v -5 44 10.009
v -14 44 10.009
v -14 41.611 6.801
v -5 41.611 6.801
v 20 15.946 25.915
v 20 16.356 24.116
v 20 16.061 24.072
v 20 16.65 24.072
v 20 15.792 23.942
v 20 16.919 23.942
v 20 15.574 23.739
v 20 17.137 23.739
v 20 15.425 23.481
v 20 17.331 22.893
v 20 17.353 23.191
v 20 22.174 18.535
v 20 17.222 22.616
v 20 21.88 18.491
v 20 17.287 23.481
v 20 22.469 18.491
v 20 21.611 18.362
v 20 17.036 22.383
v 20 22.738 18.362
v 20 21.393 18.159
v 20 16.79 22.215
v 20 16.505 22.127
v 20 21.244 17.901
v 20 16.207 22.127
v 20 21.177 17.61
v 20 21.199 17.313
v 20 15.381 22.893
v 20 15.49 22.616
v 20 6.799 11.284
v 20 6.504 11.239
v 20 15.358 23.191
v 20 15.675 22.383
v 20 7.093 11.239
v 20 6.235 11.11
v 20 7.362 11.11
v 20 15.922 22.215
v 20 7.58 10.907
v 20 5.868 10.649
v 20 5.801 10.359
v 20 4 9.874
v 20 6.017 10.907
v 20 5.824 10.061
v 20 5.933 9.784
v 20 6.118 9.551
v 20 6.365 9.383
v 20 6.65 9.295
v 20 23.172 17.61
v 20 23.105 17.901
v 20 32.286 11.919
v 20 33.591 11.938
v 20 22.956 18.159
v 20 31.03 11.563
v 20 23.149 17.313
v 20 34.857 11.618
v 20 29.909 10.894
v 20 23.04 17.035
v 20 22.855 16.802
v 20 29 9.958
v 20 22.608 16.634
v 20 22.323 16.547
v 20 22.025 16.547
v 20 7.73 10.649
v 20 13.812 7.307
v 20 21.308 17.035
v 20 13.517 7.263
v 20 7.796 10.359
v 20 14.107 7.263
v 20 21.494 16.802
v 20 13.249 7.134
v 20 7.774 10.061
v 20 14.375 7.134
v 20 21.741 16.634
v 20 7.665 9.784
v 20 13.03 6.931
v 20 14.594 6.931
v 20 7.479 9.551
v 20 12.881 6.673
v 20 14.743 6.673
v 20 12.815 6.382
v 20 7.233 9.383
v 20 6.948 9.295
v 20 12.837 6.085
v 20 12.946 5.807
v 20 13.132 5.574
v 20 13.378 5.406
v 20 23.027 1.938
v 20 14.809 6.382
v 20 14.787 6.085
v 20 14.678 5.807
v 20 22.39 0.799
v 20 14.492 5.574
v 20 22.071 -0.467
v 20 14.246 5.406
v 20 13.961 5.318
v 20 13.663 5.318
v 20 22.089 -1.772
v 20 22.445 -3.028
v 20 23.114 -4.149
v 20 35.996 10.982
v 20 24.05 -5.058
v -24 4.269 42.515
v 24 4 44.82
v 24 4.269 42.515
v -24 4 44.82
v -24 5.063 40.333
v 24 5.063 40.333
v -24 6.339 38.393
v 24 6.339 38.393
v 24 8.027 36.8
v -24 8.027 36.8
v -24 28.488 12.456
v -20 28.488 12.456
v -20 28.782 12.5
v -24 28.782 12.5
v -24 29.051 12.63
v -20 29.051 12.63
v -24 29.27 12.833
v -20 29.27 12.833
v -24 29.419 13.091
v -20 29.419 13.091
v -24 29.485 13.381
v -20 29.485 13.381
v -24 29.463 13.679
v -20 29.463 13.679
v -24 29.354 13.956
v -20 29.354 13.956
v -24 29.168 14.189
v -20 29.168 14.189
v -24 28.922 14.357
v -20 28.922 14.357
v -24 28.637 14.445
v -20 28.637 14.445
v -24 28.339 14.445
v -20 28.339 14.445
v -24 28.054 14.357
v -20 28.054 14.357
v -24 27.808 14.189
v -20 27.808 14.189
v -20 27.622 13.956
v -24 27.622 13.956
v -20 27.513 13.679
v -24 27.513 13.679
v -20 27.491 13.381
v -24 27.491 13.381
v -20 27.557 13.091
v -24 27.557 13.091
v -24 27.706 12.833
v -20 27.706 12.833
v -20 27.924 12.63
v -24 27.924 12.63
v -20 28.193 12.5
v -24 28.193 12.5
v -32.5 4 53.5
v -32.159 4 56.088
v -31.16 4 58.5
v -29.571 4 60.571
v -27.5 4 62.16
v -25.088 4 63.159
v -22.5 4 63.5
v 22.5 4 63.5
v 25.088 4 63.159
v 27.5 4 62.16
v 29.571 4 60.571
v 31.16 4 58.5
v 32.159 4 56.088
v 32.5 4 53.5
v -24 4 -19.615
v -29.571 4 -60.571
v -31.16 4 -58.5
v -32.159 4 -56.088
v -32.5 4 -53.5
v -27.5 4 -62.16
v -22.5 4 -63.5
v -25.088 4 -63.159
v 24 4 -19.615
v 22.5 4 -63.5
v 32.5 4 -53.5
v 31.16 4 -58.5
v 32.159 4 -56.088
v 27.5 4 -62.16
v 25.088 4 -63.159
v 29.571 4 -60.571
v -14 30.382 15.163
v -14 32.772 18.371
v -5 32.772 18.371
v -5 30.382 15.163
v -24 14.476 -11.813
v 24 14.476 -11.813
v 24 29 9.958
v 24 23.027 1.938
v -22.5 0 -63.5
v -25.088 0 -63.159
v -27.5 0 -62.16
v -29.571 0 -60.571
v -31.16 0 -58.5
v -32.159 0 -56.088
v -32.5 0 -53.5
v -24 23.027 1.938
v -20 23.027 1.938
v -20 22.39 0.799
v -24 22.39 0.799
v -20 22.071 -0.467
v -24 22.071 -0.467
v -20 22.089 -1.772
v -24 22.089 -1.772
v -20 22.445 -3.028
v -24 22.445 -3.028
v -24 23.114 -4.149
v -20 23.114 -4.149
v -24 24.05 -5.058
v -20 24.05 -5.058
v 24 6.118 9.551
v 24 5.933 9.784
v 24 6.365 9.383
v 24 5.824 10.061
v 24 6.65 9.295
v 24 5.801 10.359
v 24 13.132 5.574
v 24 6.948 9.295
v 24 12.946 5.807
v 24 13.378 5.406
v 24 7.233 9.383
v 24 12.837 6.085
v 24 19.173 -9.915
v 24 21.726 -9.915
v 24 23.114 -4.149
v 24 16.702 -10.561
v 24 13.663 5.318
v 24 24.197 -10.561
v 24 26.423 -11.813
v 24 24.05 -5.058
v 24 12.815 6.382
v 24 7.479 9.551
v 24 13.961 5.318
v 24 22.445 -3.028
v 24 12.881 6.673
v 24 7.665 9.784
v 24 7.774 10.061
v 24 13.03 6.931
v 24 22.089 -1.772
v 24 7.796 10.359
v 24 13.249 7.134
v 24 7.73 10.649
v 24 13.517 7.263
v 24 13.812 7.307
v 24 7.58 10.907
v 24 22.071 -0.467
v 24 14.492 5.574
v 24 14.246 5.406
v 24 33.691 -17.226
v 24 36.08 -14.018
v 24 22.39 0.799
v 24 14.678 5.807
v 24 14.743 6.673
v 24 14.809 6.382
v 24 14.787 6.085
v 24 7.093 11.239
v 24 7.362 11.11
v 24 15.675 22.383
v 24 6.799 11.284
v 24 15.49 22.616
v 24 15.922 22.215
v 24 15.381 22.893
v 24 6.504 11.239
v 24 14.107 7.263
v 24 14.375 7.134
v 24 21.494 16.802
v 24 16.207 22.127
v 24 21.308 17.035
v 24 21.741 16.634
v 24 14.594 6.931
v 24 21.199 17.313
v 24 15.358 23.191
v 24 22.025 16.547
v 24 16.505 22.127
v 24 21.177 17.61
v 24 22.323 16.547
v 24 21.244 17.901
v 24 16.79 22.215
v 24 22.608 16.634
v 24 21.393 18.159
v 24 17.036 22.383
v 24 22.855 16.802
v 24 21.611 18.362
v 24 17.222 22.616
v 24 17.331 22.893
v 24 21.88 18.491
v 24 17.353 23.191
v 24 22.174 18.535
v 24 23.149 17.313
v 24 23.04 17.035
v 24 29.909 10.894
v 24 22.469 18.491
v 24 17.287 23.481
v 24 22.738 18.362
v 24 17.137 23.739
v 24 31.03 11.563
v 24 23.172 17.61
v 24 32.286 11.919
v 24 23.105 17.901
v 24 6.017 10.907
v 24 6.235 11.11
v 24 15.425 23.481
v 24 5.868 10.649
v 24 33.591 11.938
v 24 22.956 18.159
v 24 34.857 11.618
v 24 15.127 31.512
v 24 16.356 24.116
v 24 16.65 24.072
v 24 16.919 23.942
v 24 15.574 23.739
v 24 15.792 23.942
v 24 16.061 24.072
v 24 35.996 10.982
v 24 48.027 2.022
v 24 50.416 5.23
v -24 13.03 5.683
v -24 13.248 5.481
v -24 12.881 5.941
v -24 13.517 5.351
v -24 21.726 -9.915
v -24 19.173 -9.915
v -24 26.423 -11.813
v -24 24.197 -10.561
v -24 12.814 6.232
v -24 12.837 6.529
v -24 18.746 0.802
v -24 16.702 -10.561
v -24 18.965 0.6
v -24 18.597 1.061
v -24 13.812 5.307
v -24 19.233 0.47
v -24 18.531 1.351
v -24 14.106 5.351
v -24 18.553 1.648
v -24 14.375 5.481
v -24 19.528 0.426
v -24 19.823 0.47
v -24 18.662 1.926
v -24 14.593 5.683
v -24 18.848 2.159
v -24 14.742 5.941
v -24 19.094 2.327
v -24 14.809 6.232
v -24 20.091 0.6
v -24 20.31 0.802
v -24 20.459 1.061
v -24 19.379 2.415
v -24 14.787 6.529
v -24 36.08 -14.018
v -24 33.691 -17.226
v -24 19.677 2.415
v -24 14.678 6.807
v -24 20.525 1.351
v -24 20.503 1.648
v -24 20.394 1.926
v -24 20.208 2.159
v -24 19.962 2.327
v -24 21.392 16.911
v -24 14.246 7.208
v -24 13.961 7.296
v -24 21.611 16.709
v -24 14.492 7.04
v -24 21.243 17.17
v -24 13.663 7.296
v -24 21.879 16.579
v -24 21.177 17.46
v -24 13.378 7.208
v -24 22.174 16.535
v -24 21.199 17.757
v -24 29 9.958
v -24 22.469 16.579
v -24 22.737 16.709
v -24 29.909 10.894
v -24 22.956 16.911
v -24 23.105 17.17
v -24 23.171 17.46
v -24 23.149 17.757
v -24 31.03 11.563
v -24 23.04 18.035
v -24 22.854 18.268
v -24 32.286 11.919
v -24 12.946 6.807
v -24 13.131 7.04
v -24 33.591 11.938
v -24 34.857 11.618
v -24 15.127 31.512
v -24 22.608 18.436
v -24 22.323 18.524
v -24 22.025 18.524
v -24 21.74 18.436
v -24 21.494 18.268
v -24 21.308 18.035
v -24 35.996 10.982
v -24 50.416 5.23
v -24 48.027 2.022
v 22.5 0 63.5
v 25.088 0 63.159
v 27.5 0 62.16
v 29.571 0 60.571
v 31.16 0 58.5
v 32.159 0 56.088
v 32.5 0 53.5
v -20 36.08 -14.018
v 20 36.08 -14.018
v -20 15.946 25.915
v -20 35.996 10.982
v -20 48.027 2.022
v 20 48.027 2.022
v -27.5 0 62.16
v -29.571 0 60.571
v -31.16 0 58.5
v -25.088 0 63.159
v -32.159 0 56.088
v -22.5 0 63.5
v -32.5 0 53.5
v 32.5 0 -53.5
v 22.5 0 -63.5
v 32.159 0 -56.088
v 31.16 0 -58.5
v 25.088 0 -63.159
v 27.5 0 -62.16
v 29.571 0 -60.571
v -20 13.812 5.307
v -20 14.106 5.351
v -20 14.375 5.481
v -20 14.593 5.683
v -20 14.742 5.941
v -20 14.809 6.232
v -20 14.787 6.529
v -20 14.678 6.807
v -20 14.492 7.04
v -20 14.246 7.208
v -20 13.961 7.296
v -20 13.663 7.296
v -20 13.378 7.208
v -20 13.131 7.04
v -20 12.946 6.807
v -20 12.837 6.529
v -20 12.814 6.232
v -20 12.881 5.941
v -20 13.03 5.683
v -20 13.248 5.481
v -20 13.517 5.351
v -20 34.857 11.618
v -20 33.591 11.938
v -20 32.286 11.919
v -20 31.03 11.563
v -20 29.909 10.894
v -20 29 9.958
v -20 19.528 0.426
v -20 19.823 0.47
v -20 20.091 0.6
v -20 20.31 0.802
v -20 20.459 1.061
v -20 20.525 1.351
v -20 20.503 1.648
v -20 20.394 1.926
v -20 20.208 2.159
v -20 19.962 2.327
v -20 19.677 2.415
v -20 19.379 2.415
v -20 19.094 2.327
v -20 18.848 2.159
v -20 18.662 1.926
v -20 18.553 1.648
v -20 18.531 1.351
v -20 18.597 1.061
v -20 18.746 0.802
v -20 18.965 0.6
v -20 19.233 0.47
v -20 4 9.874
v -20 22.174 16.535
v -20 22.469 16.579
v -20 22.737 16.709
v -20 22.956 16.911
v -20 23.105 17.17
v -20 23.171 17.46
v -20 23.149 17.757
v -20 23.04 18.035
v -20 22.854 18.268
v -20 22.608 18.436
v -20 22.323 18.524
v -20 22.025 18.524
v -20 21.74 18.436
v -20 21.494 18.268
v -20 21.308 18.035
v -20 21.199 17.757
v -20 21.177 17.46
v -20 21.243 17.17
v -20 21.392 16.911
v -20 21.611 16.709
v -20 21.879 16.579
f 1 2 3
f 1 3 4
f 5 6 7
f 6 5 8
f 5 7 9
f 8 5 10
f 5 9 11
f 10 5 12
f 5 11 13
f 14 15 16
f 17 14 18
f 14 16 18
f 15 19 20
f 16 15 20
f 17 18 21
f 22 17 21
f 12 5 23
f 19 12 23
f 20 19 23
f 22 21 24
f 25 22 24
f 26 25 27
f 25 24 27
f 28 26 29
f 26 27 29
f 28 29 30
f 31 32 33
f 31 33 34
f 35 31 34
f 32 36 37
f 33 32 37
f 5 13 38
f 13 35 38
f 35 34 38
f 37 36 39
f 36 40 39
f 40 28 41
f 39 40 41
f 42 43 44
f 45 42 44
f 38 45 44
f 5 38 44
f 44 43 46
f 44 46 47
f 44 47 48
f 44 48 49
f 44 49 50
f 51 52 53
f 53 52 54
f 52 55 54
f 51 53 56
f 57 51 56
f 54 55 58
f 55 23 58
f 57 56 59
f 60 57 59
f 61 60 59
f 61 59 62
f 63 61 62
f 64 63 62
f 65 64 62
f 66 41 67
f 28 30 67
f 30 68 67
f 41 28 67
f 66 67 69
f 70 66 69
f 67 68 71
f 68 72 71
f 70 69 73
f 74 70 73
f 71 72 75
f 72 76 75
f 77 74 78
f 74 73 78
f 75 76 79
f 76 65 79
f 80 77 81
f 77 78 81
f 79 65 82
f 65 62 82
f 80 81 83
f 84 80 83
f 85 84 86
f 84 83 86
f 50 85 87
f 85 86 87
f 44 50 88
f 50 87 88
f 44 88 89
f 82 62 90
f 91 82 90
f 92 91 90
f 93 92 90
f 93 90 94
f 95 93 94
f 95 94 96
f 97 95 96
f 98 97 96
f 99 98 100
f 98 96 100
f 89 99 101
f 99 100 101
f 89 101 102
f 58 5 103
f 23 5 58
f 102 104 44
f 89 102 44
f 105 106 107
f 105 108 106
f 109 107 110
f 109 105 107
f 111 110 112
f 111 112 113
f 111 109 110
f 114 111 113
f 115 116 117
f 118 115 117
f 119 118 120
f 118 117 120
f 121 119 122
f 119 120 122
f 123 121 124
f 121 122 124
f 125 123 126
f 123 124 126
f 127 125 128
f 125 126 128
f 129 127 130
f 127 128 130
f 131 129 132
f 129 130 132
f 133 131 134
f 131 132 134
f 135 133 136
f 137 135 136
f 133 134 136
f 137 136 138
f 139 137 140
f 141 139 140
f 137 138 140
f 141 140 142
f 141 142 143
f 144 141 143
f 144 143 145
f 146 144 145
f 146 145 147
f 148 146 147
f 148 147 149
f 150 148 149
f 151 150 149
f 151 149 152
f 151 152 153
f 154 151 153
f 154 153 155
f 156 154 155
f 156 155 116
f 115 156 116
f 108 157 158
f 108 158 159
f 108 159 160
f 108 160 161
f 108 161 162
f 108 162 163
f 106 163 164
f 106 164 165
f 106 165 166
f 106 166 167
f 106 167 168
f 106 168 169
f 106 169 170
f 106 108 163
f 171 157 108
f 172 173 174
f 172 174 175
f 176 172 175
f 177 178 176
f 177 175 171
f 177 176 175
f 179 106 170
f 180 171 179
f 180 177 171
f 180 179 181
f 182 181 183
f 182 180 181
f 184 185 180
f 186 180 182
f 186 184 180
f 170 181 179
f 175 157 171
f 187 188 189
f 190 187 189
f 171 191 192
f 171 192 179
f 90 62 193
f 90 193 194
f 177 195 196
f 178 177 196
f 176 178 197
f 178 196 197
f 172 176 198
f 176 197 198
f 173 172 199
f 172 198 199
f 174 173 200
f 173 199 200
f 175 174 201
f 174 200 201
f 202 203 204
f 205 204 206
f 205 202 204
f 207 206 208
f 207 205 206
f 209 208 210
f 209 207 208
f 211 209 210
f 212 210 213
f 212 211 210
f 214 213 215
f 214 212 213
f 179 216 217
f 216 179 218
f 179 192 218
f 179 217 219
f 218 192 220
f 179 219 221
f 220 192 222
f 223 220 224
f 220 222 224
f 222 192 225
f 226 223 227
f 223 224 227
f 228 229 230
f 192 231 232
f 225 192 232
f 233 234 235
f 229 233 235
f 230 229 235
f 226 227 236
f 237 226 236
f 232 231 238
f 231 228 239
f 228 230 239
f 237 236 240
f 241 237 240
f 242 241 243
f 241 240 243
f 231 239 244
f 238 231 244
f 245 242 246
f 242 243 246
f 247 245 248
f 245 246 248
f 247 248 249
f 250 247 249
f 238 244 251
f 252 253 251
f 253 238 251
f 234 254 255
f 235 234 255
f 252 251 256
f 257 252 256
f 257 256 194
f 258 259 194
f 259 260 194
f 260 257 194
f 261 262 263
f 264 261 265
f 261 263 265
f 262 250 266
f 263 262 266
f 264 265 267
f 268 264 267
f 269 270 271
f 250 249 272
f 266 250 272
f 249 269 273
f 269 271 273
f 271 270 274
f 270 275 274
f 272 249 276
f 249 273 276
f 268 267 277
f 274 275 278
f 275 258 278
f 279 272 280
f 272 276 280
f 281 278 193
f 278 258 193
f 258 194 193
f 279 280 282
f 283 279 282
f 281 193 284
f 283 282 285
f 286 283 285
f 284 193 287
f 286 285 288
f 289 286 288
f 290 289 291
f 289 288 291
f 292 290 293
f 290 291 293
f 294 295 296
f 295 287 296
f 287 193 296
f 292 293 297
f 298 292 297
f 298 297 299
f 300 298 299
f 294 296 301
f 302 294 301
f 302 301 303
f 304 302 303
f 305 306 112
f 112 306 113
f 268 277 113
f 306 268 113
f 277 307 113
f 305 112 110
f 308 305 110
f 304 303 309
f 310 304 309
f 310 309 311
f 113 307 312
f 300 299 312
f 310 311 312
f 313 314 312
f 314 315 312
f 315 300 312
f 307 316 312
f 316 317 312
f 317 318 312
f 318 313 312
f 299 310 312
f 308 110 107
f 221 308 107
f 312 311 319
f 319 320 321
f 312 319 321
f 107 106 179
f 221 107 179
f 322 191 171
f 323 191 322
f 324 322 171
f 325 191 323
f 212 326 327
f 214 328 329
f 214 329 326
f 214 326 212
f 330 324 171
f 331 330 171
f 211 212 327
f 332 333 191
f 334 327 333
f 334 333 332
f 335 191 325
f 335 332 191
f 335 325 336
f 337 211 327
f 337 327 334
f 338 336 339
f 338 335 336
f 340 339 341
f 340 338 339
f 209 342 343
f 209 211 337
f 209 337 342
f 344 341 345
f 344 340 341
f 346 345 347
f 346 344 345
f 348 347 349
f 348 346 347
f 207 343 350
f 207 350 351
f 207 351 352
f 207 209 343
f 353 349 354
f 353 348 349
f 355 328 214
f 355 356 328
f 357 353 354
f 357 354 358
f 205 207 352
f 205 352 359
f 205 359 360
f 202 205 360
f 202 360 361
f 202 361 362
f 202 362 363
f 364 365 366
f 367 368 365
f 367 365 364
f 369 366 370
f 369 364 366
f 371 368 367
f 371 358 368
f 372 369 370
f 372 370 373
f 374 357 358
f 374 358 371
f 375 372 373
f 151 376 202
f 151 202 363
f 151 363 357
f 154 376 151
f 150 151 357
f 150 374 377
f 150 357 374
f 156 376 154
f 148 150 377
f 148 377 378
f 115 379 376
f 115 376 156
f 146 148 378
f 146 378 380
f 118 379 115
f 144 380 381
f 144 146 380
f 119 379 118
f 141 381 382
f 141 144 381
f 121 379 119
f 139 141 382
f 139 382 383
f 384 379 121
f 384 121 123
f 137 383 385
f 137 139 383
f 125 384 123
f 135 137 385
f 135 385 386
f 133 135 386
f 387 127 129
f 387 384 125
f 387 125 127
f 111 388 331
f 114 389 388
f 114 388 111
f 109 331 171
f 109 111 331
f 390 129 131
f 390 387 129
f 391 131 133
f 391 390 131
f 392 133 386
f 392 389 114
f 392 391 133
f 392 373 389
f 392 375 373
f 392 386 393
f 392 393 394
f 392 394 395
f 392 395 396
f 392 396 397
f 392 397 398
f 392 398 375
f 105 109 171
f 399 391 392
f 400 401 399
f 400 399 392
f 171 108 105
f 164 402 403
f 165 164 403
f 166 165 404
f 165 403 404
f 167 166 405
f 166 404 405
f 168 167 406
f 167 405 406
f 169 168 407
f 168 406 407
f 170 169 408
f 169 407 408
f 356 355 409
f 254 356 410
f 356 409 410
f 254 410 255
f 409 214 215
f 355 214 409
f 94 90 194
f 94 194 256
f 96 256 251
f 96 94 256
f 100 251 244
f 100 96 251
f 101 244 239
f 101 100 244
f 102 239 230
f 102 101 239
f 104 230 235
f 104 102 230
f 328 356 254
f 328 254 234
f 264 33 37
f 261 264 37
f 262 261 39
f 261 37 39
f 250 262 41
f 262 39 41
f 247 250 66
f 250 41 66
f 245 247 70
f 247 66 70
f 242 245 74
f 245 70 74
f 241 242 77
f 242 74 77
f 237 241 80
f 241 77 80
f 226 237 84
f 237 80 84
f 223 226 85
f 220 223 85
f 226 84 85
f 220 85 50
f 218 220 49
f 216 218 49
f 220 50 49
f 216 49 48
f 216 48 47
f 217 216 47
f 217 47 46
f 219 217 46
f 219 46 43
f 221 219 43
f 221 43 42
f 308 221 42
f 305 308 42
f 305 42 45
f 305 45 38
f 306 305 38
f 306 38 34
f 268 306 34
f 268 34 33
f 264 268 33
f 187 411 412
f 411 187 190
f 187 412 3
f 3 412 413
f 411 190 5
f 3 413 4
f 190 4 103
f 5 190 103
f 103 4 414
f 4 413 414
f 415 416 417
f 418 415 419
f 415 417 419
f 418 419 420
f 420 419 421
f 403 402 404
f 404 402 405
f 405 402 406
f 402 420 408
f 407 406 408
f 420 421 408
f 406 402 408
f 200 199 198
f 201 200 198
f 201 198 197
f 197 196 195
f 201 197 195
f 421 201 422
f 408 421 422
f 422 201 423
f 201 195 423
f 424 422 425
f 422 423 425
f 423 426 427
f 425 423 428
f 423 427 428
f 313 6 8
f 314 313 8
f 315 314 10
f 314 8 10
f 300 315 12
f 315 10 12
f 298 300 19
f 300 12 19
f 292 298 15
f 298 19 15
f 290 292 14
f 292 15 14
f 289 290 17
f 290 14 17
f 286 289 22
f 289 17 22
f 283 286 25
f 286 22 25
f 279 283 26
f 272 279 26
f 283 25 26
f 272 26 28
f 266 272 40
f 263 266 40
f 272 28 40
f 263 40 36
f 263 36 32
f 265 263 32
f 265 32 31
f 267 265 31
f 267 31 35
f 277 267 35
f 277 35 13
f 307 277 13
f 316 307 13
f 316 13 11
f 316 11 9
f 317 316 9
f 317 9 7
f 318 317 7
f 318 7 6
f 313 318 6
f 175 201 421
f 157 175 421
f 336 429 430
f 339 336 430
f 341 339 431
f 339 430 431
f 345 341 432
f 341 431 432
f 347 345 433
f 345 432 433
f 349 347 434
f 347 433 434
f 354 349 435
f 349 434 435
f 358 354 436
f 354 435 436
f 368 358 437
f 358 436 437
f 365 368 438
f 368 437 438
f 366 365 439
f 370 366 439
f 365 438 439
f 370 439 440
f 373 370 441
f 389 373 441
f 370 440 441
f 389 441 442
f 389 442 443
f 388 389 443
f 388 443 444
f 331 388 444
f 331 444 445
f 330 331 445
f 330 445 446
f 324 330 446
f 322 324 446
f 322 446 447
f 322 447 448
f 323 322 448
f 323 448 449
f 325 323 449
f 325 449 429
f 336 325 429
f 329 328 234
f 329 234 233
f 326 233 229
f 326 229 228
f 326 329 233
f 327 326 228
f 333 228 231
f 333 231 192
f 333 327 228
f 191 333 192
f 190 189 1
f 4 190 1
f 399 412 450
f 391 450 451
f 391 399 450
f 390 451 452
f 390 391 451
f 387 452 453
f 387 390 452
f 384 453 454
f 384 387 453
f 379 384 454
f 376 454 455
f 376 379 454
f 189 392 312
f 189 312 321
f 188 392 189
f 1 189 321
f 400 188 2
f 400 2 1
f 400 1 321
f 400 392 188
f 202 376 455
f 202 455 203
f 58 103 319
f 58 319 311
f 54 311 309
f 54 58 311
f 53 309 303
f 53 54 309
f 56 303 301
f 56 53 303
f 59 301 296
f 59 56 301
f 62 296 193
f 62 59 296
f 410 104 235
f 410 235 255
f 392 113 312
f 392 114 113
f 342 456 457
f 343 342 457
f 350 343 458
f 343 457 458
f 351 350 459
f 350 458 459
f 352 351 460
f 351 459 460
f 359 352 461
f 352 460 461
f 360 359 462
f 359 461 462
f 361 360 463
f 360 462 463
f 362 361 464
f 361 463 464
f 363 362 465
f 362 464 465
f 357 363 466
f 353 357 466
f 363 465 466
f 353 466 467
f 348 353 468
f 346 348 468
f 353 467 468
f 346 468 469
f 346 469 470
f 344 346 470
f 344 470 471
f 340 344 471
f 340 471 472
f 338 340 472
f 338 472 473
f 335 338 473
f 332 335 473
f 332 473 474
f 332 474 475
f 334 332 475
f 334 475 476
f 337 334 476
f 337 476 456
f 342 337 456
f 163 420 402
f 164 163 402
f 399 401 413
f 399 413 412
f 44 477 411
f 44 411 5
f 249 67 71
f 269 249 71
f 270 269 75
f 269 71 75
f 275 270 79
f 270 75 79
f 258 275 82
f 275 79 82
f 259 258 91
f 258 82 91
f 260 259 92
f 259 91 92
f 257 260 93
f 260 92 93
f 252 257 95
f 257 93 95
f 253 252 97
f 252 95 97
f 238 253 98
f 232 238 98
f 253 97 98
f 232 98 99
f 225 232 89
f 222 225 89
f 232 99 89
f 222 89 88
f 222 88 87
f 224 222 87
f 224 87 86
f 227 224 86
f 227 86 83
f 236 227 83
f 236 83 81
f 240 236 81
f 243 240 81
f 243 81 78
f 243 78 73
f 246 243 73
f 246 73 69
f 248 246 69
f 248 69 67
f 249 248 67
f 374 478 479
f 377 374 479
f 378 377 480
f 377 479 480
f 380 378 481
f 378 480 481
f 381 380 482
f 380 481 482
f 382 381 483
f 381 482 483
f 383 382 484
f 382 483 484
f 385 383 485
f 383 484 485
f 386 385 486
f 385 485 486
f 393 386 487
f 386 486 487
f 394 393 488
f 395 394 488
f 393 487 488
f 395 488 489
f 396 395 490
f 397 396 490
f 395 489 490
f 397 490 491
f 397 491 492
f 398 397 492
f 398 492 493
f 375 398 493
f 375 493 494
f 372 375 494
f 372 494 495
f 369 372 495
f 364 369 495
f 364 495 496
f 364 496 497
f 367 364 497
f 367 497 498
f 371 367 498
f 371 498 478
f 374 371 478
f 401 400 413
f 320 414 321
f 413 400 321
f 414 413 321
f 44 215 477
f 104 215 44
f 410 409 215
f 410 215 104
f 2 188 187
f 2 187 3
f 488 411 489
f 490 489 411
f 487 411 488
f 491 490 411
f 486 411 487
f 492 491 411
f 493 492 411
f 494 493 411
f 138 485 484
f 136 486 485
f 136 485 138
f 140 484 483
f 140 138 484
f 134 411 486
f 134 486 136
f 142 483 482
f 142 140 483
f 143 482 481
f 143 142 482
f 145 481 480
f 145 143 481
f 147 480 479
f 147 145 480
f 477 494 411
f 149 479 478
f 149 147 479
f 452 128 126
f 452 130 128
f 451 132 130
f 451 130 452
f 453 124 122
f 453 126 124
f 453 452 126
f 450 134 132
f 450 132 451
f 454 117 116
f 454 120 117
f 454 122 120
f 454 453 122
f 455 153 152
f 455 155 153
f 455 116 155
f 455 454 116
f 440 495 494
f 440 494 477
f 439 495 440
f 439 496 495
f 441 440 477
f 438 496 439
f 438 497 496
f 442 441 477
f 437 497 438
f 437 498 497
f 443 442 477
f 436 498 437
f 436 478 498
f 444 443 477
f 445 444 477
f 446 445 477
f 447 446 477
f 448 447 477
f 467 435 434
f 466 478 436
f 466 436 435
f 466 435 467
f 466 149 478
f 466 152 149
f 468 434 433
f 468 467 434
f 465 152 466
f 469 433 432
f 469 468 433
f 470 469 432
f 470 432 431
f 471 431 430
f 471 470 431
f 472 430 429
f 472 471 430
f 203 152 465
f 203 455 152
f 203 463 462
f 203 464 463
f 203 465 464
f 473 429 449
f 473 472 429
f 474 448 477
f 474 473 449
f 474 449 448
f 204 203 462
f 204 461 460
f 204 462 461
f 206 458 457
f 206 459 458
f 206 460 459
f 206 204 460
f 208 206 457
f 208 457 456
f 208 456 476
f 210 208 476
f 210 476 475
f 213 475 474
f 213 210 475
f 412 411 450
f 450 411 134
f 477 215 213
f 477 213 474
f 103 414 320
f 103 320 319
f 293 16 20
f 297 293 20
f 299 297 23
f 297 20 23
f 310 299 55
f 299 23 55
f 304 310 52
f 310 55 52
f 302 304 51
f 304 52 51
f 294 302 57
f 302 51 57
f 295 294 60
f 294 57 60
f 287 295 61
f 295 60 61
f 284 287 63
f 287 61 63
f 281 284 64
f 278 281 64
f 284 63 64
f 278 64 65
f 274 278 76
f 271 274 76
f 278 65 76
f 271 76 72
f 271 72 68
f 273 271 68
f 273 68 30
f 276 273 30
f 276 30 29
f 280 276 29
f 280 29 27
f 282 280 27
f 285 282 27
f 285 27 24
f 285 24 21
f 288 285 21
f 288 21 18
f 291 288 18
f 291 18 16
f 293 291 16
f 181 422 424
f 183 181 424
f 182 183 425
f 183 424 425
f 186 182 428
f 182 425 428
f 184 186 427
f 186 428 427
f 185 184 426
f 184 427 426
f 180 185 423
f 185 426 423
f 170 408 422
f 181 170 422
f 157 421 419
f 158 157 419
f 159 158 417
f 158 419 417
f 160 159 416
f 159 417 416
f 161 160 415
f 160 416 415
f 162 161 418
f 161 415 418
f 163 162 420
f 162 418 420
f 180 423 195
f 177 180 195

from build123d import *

# Parameters (mm, degrees)
BASE_PLATE_EXTRUDE_DEPTH    = 4
MOTORCASEEXTRUDE_DEPTH      = 24
MOTORCASEEXTRUDE_DEPTH_BACK = 24
SKETCH7_W                   = 40
SKETCH7_H                   = 20
CUT_EXTRUDE1_DEPTH          = 44
SKETCH9_W                   = 48
SKETCH9_H                   = 4
CUT_EXTRUDE2_DEPTH          = 28
FILLET_2_DEPTH              = 48
SKETCH11_W                  = 9
SKETCH11_H                  = 14
HOLE_FOR_WIRE_DEPTH         = 4
CUT_EXTRUDE3_REACH          = 14.5
SKETCH13_R                  = 1
CUT_EXTRUDE4_REACH          = 14.5
SKETCH14_R                  = 1


with BuildPart() as part:
    # Sketch1 → base_plate_extrude (new body)
    with BuildSketch(Plane(origin=(0, 0, 0), x_dir=(1, 0, 0), z_dir=(0, 1, 0))):
        with BuildLine():
            Line((-22.5, -63.5), (22.5, -63.5))
            ThreePointArc((22.5, -63.5), (29.571067812, -60.571067812), (32.5, -53.5))
            Line((32.5, -53.5), (32.5, 53.5))
            ThreePointArc((32.5, 53.5), (29.571067812, 60.571067812), (22.5, 63.5))
            Line((22.5, 63.5), (-22.5, 63.5))
            ThreePointArc((-22.5, 63.5), (-29.571067812, 60.571067812), (-32.5, 53.5))
            Line((-32.5, 53.5), (-32.5, -53.5))
            ThreePointArc((-32.5, -53.5), (-29.571067812, -60.571067812), (-22.5, -63.5))
        make_face()
    extrude(amount=BASE_PLATE_EXTRUDE_DEPTH)

    # Sketch5 → MotorCaseExtrude (add, two sides)
    with BuildSketch(Plane.ZY) as motorcaseextrude_sk:
        with BuildLine():
            Line((31.511856475, 15.127443917), (2.840895128, 53.623884992))
            Line((2.840895128, 53.623884992), (-19.615362165, 36.89915754))
            Line((-19.615362165, 36.89915754), (-11.812816694, 26.422695717))
            ThreePointArc((-11.812816694, 26.422695717), (-9.832908585, 20.44957877), (-11.812816694, 14.476461823))
            Line((-11.812816694, 14.476461823), (-19.615362165, 4))
            Line((-19.615362165, 4), (39.799233322, 4))
            Line((39.799233322, 4), (44.820226981, 4))
            ThreePointArc((44.820226981, 4), (40.333088108, 5.063245291), (36.80013509, 8.026883053))
            Line((36.80013509, 8.026883053), (31.511856475, 15.127443917))
        make_face()
    extrude(amount=MOTORCASEEXTRUDE_DEPTH)
    extrude(motorcaseextrude_sk.sketch, amount=-MOTORCASEEXTRUDE_DEPTH_BACK)

    # Sketch7 → Cut-Extrude1 (cut)
    with BuildSketch(Plane(origin=(0, 33.130958404, -24.674915427), x_dir=(1, 0, 0), z_dir=(0, 0.802009189, -0.597311695))):
        with Locations((0, -20.308597621)):
            Rectangle(SKETCH7_W, SKETCH7_H)
    extrude(amount=-CUT_EXTRUDE1_DEPTH, mode=Mode.SUBTRACT)

    # Sketch9 → Cut-Extrude2 (cut)
    with BuildSketch(Plane(origin=(0, 20.492926589, 27.515810556), x_dir=(1, 0, 0), z_dir=(0, 0.597311695, 0.802009189))):
        with Locations((0, 39.309948633)):
            Rectangle(SKETCH9_W, SKETCH9_H)
    extrude(amount=-CUT_EXTRUDE2_DEPTH, mode=Mode.SUBTRACT)

    # Sketch10 → fillet 2 (cut)
    with BuildSketch(Plane.ZY.offset(24)):
        with BuildLine():
            Line((-14.01807863, 36.080367563), (2.022105151, 48.026601457))
            Line((2.022105151, 48.026601457), (10.981780572, 35.996463621))
            ThreePointArc((10.981780572, 35.996463621), (11.919081057, 32.286190216), (9.9582931, 28.999859202))
            Line((9.9582931, 28.999859202), (1.93820121, 23.026742255))
            ThreePointArc((1.93820121, 23.026742255), (-1.772072196, 22.08944177), (-5.058403209, 24.050229727))
            Line((-5.058403209, 24.050229727), (-14.01807863, 36.080367563))
        make_face()
    extrude(amount=-FILLET_2_DEPTH, mode=Mode.SUBTRACT)

    # Sketch11 → Hole for wire (cut)
    with BuildSketch(Plane(origin=(0, 20.492926589, 27.515810556), x_dir=(1, 0, 0), z_dir=(0, 0.597311695, 0.802009189))):
        with Locations((-9.5, 22.309948633)):
            Rectangle(SKETCH11_W, SKETCH11_H)
    extrude(amount=-HOLE_FOR_WIRE_DEPTH, mode=Mode.SUBTRACT)

    # Sketch13 → Cut-Extrude3 (cut, up to next)
    with BuildSketch(Plane(origin=(-20, 0, 0), x_dir=(0, 0, -1), z_dir=(1, 0, 0)), mode=Mode.PRIVATE) as cut_extrude3_sk1:
        with Locations((-6.306750122, 13.811617607)):
            Circle(SKETCH13_R)
    cut_extrude3_tool1 = extrude(cut_extrude3_sk1.sketch, amount=-CUT_EXTRUDE3_REACH, mode=Mode.PRIVATE) & part.part
    add(cut_extrude3_tool1.solids().sort_by_distance((-20, 13.811618, 6.30675))[0], mode=Mode.SUBTRACT)
    # Sketch13 → Cut-Extrude3 (cut, up to next)
    with BuildSketch(Plane(origin=(-20, 0, 0), x_dir=(0, 0, -1), z_dir=(1, 0, 0)), mode=Mode.PRIVATE) as cut_extrude3_sk2:
        with Locations((-1.425907817, 19.528030678)):
            Circle(SKETCH13_R)
    cut_extrude3_tool2 = extrude(cut_extrude3_sk2.sketch, amount=-CUT_EXTRUDE3_REACH, mode=Mode.PRIVATE) & part.part
    add(cut_extrude3_tool2.solids().sort_by_distance((-20, 19.528031, 1.425908))[0], mode=Mode.SUBTRACT)
    # Sketch13 → Cut-Extrude3 (cut, up to next)
    with BuildSketch(Plane(origin=(-20, 0, 0), x_dir=(0, 0, -1), z_dir=(1, 0, 0)), mode=Mode.PRIVATE) as cut_extrude3_sk3:
        with Locations((-13.456045653, 28.487706099)):
            Circle(SKETCH13_R)
    cut_extrude3_tool3 = extrude(cut_extrude3_sk3.sketch, amount=-CUT_EXTRUDE3_REACH, mode=Mode.PRIVATE) & part.part
    add(cut_extrude3_tool3.solids().sort_by_distance((-20, 28.487706, 13.456046))[0], mode=Mode.SUBTRACT)
    # Sketch13 → Cut-Extrude3 (cut, up to next)
    with BuildSketch(Plane(origin=(-20, 0, 0), x_dir=(0, 0, -1), z_dir=(1, 0, 0)), mode=Mode.PRIVATE) as cut_extrude3_sk4:
        with Locations((-17.534878769, 22.173981333)):
            Circle(SKETCH13_R)
    cut_extrude3_tool4 = extrude(cut_extrude3_sk4.sketch, amount=-CUT_EXTRUDE3_REACH, mode=Mode.PRIVATE) & part.part
    add(cut_extrude3_tool4.solids().sort_by_distance((-20, 22.173981, 17.534879))[0], mode=Mode.SUBTRACT)

    # Sketch14 → Cut-Extrude4 (cut, up to next)
    with BuildSketch(Plane.ZY.offset(-20), mode=Mode.PRIVATE) as cut_extrude4_sk1:
        with Locations((10.283784148, 6.798641768)):
            Circle(SKETCH14_R)
    cut_extrude4_tool1 = extrude(cut_extrude4_sk1.sketch, amount=-CUT_EXTRUDE4_REACH, mode=Mode.PRIVATE) & part.part
    add(cut_extrude4_tool1.solids().sort_by_distance((20, 6.798642, 10.283784))[0], mode=Mode.SUBTRACT)
    # Sketch14 → Cut-Extrude4 (cut, up to next)
    with BuildSketch(Plane.ZY.offset(-20), mode=Mode.PRIVATE) as cut_extrude4_sk2:
        with Locations((23.115931173, 16.355628883)):
            Circle(SKETCH14_R)
    cut_extrude4_tool2 = extrude(cut_extrude4_sk2.sketch, amount=-CUT_EXTRUDE4_REACH, mode=Mode.PRIVATE) & part.part
    add(cut_extrude4_tool2.solids().sort_by_distance((20, 16.355629, 23.115931))[0], mode=Mode.SUBTRACT)
    # Sketch14 → Cut-Extrude4 (cut, up to next)
    with BuildSketch(Plane.ZY.offset(-20), mode=Mode.PRIVATE) as cut_extrude4_sk3:
        with Locations((6.307299779, 13.812026975)):
            Circle(SKETCH14_R)
    cut_extrude4_tool3 = extrude(cut_extrude4_sk3.sketch, amount=-CUT_EXTRUDE4_REACH, mode=Mode.PRIVATE) & part.part
    add(cut_extrude4_tool3.solids().sort_by_distance((20, 13.812027, 6.3073))[0], mode=Mode.SUBTRACT)
    # Sketch14 → Cut-Extrude4 (cut, up to next)
    with BuildSketch(Plane.ZY.offset(-20), mode=Mode.PRIVATE) as cut_extrude4_sk4:
        with Locations((17.535428426, 22.174390701)):
            Circle(SKETCH14_R)
    cut_extrude4_tool4 = extrude(cut_extrude4_sk4.sketch, amount=-CUT_EXTRUDE4_REACH, mode=Mode.PRIVATE) & part.part
    add(cut_extrude4_tool4.solids().sort_by_distance((20, 22.174391, 17.535428))[0], mode=Mode.SUBTRACT)


solid = part.part
